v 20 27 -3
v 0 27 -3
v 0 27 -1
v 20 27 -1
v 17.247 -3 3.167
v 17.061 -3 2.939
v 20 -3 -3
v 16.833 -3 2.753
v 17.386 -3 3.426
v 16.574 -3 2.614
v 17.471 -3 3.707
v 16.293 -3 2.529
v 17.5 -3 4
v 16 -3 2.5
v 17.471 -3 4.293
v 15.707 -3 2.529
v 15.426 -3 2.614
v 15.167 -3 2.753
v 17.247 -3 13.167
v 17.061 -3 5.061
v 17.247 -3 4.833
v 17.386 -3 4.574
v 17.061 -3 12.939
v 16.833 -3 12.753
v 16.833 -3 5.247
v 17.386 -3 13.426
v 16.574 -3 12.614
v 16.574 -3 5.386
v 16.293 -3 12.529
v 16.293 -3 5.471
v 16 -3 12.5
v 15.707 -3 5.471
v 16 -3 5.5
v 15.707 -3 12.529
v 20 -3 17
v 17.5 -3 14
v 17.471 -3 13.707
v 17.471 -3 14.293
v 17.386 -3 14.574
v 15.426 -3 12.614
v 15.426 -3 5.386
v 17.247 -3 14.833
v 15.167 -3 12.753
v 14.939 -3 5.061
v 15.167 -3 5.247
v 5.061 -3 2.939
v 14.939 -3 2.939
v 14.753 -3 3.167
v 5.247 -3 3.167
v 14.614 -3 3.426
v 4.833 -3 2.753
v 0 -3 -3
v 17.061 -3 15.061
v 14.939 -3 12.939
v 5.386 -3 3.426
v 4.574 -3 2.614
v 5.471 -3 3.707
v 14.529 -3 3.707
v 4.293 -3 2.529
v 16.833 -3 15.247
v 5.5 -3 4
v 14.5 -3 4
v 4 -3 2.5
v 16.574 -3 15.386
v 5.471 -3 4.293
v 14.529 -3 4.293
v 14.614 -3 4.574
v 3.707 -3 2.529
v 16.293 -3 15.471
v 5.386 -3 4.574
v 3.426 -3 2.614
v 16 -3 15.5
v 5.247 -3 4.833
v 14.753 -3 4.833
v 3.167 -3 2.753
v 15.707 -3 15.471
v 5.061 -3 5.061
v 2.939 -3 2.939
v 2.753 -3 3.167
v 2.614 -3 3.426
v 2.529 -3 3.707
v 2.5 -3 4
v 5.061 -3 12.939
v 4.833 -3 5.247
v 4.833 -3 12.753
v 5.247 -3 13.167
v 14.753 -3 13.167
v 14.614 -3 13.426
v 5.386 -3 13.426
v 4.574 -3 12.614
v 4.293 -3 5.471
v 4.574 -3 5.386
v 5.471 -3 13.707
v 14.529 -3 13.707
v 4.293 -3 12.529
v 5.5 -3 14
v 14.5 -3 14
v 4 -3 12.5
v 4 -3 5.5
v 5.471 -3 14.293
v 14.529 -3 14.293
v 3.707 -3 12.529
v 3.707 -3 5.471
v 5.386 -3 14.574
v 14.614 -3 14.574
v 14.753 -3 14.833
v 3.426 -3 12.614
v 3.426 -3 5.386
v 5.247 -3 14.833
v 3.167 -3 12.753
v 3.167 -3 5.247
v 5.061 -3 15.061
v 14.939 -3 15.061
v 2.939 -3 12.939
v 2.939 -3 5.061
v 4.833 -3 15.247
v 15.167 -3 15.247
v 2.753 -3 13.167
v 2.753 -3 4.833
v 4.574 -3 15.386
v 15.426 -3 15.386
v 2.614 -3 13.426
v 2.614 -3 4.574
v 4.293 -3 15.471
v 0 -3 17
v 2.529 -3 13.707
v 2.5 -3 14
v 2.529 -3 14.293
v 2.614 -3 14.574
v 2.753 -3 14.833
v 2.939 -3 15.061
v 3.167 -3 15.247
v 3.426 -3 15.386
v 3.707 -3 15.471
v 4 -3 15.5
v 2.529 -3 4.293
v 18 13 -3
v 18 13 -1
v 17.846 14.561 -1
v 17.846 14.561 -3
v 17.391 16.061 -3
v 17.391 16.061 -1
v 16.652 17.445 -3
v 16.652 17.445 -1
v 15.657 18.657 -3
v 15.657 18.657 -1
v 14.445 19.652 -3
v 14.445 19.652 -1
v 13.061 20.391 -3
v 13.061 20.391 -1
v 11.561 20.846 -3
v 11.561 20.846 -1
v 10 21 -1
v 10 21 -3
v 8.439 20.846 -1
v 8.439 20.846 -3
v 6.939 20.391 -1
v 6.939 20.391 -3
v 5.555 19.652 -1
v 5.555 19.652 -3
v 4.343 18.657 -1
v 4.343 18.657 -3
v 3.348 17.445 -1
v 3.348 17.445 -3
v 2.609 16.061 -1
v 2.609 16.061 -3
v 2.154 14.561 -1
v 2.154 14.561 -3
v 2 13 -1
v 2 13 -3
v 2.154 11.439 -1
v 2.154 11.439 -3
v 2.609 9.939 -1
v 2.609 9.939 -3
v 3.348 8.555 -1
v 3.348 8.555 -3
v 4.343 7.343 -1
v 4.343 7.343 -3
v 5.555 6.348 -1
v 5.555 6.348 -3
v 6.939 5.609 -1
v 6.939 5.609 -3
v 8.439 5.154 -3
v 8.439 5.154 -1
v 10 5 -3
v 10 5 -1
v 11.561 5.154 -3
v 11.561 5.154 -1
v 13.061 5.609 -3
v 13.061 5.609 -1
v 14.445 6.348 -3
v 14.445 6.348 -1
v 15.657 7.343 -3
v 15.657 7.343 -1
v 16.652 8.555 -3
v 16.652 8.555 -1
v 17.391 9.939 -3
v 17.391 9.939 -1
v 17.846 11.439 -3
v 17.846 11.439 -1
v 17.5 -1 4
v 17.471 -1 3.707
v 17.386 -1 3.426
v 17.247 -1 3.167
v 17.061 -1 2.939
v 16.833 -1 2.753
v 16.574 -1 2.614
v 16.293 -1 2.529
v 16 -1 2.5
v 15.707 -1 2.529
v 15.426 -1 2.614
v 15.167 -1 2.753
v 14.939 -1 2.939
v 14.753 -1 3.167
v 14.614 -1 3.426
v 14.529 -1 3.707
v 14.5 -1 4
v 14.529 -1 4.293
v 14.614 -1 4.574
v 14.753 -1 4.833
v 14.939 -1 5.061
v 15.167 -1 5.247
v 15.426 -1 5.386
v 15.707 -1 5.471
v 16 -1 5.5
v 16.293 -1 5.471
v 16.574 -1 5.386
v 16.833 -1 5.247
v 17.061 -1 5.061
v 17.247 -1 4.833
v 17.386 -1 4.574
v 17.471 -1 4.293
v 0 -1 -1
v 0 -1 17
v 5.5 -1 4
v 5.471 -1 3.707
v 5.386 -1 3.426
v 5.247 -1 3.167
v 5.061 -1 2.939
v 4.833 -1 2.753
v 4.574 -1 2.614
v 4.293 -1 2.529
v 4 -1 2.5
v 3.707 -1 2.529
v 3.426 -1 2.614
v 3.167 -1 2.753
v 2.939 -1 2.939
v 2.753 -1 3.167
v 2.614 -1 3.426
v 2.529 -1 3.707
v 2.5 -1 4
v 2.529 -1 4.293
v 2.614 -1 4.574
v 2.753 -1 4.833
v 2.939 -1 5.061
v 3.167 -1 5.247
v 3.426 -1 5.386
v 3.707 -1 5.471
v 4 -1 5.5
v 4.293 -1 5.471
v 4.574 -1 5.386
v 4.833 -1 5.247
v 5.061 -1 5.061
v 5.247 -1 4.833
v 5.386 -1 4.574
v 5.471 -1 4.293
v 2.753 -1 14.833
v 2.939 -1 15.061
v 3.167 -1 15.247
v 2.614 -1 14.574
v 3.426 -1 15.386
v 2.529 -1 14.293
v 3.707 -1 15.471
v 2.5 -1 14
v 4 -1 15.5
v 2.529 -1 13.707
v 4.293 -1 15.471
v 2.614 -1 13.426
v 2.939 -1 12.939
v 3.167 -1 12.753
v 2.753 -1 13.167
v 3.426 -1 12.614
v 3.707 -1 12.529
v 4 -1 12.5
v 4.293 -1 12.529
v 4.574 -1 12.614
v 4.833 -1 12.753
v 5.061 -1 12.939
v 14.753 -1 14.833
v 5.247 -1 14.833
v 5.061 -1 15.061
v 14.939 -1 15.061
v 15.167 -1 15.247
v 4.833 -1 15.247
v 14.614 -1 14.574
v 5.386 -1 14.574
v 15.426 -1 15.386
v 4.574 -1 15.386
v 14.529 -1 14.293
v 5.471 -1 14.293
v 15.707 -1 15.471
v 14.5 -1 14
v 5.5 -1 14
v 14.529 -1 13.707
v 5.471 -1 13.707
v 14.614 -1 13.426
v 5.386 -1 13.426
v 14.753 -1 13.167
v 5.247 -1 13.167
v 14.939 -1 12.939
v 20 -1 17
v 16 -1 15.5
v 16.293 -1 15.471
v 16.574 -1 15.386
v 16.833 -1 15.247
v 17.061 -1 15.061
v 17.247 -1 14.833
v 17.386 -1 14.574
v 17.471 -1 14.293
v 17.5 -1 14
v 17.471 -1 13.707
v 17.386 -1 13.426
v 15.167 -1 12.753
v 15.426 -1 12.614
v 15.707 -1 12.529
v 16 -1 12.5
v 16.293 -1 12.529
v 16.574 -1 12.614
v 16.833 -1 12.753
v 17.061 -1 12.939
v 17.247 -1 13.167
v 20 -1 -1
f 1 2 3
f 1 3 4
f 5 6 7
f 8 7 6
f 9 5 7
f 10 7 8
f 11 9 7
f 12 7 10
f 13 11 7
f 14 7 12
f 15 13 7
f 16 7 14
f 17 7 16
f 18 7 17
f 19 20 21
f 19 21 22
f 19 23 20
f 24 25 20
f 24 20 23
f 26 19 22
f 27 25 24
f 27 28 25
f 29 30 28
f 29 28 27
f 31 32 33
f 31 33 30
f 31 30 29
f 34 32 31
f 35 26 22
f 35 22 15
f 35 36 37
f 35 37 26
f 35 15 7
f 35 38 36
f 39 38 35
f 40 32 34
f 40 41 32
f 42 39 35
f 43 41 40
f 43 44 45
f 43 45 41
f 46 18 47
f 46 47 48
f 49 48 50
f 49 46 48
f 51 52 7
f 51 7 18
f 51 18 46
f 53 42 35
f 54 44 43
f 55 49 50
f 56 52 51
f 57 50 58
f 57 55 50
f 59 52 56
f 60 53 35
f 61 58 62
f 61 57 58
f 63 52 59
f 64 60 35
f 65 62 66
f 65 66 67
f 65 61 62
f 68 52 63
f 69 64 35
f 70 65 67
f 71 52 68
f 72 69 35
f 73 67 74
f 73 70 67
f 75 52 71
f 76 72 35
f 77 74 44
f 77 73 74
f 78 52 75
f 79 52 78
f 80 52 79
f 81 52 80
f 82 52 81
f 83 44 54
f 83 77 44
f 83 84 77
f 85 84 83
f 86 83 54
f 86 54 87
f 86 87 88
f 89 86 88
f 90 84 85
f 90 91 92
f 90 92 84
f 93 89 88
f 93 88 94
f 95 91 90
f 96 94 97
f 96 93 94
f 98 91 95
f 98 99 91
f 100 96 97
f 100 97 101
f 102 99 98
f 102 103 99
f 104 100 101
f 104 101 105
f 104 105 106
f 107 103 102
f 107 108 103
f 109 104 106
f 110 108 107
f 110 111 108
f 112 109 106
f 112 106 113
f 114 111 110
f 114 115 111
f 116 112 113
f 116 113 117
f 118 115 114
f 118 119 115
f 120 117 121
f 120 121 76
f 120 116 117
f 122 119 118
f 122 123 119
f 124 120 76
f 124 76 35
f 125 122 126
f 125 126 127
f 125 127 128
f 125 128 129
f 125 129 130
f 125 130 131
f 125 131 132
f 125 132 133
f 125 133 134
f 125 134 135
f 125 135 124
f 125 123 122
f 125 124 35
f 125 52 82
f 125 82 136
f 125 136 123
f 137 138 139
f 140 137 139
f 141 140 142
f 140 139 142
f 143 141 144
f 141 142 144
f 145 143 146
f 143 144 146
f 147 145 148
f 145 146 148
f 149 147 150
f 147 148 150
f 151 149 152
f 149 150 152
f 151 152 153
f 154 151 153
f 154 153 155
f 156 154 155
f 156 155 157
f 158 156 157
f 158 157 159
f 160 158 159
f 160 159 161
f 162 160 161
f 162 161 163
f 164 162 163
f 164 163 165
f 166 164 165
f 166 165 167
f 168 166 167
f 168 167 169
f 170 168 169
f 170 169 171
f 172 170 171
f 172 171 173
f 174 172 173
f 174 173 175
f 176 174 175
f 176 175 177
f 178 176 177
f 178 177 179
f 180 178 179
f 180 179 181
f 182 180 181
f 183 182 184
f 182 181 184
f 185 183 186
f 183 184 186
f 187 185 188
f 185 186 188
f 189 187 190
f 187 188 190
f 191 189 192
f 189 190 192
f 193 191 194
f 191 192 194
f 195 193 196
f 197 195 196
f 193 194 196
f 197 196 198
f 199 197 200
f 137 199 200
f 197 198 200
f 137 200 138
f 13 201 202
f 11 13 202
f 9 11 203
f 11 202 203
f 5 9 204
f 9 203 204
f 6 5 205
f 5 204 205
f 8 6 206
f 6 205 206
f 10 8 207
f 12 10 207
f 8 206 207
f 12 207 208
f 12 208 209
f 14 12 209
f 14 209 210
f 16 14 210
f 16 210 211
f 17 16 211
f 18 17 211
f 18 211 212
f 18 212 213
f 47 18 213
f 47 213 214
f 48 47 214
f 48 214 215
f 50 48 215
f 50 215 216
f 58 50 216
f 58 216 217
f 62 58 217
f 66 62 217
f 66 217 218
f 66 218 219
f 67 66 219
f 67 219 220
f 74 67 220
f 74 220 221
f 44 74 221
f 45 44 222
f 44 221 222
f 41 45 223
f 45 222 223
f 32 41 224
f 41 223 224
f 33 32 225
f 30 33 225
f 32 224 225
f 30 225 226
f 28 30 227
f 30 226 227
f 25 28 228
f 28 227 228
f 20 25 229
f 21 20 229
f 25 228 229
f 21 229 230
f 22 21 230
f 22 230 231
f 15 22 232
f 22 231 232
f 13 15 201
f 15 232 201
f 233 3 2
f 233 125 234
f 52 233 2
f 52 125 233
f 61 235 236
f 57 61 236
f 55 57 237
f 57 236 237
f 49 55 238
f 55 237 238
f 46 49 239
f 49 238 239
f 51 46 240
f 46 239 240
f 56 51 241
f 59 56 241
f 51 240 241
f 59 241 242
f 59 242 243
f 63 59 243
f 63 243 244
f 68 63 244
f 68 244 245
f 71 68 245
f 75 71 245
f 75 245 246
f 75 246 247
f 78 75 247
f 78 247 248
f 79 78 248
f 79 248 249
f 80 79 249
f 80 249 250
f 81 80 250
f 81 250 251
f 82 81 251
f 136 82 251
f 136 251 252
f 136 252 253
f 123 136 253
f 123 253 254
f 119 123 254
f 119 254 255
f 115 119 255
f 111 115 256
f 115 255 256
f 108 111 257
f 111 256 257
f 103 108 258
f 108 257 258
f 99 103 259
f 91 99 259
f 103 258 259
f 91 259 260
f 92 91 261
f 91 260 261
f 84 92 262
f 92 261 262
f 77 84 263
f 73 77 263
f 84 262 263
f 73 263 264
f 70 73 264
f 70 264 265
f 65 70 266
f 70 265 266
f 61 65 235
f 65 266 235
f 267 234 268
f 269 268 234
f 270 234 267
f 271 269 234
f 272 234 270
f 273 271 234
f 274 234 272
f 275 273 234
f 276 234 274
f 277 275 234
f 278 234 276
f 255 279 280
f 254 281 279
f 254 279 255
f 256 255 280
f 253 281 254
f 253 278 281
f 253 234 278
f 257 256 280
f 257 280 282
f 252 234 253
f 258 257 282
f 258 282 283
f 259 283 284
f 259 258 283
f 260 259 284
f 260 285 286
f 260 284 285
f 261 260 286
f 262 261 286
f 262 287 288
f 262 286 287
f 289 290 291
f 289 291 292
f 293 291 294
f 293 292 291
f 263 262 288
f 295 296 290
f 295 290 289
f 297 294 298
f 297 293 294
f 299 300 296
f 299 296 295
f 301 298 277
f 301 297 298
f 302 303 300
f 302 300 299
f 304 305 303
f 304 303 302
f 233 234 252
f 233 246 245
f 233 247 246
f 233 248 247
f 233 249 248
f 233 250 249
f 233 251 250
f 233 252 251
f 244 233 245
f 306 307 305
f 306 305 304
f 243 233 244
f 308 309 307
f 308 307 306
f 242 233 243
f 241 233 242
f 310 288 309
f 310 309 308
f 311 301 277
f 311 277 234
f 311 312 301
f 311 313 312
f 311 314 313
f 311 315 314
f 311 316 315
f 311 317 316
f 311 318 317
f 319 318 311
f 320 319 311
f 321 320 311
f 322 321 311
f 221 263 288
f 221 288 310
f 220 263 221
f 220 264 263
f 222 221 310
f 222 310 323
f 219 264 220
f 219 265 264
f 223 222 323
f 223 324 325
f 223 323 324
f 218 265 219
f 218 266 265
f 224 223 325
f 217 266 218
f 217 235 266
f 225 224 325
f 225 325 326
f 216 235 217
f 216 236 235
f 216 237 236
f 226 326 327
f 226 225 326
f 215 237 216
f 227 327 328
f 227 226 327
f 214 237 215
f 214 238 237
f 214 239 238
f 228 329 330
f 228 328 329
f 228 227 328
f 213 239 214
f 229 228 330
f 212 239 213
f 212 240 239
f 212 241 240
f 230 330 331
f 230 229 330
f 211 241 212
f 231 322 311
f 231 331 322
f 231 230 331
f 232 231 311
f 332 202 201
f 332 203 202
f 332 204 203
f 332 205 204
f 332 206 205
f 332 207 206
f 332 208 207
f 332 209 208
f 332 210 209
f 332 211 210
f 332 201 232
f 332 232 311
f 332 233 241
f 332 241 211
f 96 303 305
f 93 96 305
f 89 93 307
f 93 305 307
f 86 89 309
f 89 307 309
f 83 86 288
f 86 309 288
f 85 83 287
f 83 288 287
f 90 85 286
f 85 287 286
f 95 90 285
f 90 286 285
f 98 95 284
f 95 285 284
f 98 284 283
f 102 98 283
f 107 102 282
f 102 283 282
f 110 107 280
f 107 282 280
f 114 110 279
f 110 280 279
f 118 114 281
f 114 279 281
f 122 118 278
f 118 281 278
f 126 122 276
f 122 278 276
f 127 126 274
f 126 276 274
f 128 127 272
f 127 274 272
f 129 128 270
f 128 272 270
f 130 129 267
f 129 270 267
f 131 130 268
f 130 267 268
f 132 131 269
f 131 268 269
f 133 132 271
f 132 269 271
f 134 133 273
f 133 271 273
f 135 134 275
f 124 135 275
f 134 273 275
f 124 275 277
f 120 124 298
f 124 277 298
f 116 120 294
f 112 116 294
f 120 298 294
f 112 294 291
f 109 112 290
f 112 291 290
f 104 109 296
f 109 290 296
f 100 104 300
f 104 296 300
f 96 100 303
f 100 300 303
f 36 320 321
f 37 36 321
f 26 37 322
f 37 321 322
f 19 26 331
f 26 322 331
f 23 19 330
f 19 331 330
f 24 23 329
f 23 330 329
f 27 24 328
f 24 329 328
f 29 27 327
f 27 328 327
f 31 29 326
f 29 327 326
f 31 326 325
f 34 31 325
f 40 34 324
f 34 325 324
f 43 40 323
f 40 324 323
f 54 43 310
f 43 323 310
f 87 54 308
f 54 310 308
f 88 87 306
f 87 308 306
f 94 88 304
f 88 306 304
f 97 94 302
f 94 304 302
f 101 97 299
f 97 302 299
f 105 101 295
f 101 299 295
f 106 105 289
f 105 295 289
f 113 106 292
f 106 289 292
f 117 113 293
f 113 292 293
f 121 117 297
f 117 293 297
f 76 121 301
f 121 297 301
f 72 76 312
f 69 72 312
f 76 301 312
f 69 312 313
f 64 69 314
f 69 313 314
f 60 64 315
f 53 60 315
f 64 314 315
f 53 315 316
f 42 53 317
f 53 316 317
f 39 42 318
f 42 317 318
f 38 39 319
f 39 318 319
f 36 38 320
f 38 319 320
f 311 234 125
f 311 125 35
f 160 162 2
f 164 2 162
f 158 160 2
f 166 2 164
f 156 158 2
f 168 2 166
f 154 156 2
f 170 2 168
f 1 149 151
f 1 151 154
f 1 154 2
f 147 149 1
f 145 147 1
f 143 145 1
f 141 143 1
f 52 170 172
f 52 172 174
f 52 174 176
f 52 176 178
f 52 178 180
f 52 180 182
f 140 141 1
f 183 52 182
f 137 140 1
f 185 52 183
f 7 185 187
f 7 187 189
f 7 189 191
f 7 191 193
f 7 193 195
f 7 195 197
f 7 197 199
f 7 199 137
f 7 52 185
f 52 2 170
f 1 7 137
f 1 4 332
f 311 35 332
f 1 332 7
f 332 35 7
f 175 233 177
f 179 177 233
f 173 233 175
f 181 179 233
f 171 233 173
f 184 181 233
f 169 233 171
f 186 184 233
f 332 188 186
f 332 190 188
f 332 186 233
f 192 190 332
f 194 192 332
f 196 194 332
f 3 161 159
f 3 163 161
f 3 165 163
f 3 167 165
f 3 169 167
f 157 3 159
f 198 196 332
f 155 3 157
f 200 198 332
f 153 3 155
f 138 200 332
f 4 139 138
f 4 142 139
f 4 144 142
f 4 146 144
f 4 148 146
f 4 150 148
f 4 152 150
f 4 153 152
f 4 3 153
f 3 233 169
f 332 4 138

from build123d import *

# Parameters (mm, degrees)
EXTRUDE_1_DEPTH     = 20
CUT_EXTRUDE_1_REACH = 5
SKETCH_2_R          = 8
CUT_EXTRUDE_2_REACH = 5
SKETCH_3_R          = 1.5
SKETCH_6_W          = 20
SKETCH_6_H          = 3
EXTRUDE_2_DEPTH     = 5
SKETCH_8_W          = 20
SKETCH_8_H          = 27
CUT_EXTRUDE_5_DEPTH = 1
SKETCH_10_W         = 20
SKETCH_10_H         = 3
CUT_EXTRUDE_7_DEPTH = 18
SKETCH_11_W         = 20
SKETCH_11_H         = 18
CUT_EXTRUDE_8_DEPTH = 1
SKETCH_12_R         = 1.5
CUT_EXTRUDE_9_DEPTH = 2


with BuildPart() as part:
    # 草图1 → 凸台-拉伸1 (new body)
    with BuildSketch(Plane(origin=(0, 0, 0), x_dir=(0, 0, -1), z_dir=(1, 0, 0))):
        Polygon((0, 0), (0, 22), (3, 22), (3, -3), (-35, -3), (-35, 0), align=None)
    extrude(amount=EXTRUDE_1_DEPTH)

    # 草图2 → 切除-拉伸1 (cut, up to next)
    with BuildSketch(Plane.XY, mode=Mode.PRIVATE) as cut_extrude_1_sk1:
        with Locations((10, 13)):
            Circle(SKETCH_2_R)
    cut_extrude_1_tool1 = extrude(cut_extrude_1_sk1.sketch, amount=-CUT_EXTRUDE_1_REACH, mode=Mode.PRIVATE) & part.part
    add(cut_extrude_1_tool1.solids().sort_by_distance((10, 13, 0))[0], mode=Mode.SUBTRACT)

    # 草图3 → 切除-拉伸2 (cut, up to next)
    with BuildSketch(Plane(origin=(0, 0, 0), x_dir=(1, 0, 0), z_dir=(0, 1, 0)), mode=Mode.PRIVATE) as cut_extrude_2_sk1:
        with Locations((4, -4)):
            Circle(SKETCH_3_R)
    cut_extrude_2_tool1 = extrude(cut_extrude_2_sk1.sketch, amount=-CUT_EXTRUDE_2_REACH, mode=Mode.PRIVATE) & part.part
    add(cut_extrude_2_tool1.solids().sort_by_distance((4, 0, 4))[0], mode=Mode.SUBTRACT)
    # 草图3 → 切除-拉伸2 (cut, up to next)
    with BuildSketch(Plane(origin=(0, 0, 0), x_dir=(1, 0, 0), z_dir=(0, 1, 0)), mode=Mode.PRIVATE) as cut_extrude_2_sk2:
        with Locations((16, -4)):
            Circle(SKETCH_3_R)
    cut_extrude_2_tool2 = extrude(cut_extrude_2_sk2.sketch, amount=-CUT_EXTRUDE_2_REACH, mode=Mode.PRIVATE) & part.part
    add(cut_extrude_2_tool2.solids().sort_by_distance((16, 0, 4))[0], mode=Mode.SUBTRACT)

    # 草图6 → 凸台-拉伸2 (add)
    with BuildSketch(Plane(origin=(0, 22, 0), x_dir=(1, 0, 0), z_dir=(0, 1, 0))):
        with Locations((10, 1.5)):
            Rectangle(SKETCH_6_W, SKETCH_6_H)
    extrude(amount=EXTRUDE_2_DEPTH)

    # 草图8 → 切除-拉伸5 (cut)
    with BuildSketch(Plane.XY):
        with Locations((10, 13.5)):
            Rectangle(SKETCH_8_W, SKETCH_8_H)
    extrude(amount=-CUT_EXTRUDE_5_DEPTH, mode=Mode.SUBTRACT)

    # 草图10 → 切除-拉伸7 (cut)
    with BuildSketch(Plane.XY.offset(35)):
        with Locations((10, -1.5)):
            Rectangle(SKETCH_10_W, SKETCH_10_H)
    extrude(amount=-CUT_EXTRUDE_7_DEPTH, mode=Mode.SUBTRACT)

    # 草图11 → 切除-拉伸8 (cut)
    with BuildSketch(Plane(origin=(0, 0, 0), x_dir=(1, 0, 0), z_dir=(0, 1, 0))):
        with Locations((10, -8)):
            Rectangle(SKETCH_11_W, SKETCH_11_H)
    extrude(amount=-CUT_EXTRUDE_8_DEPTH, mode=Mode.SUBTRACT)

    # 草图12 → 切除-拉伸9 (cut)
    with BuildSketch(Plane(origin=(0, -1, 0), x_dir=(1, 0, 0), z_dir=(0, 1, 0))):
        with Locations((4, -14)):
            Circle(SKETCH_12_R)
        with Locations((16, -14)):
            Circle(SKETCH_12_R)
    extrude(amount=-CUT_EXTRUDE_9_DEPTH, mode=Mode.SUBTRACT)


solid = part.part
